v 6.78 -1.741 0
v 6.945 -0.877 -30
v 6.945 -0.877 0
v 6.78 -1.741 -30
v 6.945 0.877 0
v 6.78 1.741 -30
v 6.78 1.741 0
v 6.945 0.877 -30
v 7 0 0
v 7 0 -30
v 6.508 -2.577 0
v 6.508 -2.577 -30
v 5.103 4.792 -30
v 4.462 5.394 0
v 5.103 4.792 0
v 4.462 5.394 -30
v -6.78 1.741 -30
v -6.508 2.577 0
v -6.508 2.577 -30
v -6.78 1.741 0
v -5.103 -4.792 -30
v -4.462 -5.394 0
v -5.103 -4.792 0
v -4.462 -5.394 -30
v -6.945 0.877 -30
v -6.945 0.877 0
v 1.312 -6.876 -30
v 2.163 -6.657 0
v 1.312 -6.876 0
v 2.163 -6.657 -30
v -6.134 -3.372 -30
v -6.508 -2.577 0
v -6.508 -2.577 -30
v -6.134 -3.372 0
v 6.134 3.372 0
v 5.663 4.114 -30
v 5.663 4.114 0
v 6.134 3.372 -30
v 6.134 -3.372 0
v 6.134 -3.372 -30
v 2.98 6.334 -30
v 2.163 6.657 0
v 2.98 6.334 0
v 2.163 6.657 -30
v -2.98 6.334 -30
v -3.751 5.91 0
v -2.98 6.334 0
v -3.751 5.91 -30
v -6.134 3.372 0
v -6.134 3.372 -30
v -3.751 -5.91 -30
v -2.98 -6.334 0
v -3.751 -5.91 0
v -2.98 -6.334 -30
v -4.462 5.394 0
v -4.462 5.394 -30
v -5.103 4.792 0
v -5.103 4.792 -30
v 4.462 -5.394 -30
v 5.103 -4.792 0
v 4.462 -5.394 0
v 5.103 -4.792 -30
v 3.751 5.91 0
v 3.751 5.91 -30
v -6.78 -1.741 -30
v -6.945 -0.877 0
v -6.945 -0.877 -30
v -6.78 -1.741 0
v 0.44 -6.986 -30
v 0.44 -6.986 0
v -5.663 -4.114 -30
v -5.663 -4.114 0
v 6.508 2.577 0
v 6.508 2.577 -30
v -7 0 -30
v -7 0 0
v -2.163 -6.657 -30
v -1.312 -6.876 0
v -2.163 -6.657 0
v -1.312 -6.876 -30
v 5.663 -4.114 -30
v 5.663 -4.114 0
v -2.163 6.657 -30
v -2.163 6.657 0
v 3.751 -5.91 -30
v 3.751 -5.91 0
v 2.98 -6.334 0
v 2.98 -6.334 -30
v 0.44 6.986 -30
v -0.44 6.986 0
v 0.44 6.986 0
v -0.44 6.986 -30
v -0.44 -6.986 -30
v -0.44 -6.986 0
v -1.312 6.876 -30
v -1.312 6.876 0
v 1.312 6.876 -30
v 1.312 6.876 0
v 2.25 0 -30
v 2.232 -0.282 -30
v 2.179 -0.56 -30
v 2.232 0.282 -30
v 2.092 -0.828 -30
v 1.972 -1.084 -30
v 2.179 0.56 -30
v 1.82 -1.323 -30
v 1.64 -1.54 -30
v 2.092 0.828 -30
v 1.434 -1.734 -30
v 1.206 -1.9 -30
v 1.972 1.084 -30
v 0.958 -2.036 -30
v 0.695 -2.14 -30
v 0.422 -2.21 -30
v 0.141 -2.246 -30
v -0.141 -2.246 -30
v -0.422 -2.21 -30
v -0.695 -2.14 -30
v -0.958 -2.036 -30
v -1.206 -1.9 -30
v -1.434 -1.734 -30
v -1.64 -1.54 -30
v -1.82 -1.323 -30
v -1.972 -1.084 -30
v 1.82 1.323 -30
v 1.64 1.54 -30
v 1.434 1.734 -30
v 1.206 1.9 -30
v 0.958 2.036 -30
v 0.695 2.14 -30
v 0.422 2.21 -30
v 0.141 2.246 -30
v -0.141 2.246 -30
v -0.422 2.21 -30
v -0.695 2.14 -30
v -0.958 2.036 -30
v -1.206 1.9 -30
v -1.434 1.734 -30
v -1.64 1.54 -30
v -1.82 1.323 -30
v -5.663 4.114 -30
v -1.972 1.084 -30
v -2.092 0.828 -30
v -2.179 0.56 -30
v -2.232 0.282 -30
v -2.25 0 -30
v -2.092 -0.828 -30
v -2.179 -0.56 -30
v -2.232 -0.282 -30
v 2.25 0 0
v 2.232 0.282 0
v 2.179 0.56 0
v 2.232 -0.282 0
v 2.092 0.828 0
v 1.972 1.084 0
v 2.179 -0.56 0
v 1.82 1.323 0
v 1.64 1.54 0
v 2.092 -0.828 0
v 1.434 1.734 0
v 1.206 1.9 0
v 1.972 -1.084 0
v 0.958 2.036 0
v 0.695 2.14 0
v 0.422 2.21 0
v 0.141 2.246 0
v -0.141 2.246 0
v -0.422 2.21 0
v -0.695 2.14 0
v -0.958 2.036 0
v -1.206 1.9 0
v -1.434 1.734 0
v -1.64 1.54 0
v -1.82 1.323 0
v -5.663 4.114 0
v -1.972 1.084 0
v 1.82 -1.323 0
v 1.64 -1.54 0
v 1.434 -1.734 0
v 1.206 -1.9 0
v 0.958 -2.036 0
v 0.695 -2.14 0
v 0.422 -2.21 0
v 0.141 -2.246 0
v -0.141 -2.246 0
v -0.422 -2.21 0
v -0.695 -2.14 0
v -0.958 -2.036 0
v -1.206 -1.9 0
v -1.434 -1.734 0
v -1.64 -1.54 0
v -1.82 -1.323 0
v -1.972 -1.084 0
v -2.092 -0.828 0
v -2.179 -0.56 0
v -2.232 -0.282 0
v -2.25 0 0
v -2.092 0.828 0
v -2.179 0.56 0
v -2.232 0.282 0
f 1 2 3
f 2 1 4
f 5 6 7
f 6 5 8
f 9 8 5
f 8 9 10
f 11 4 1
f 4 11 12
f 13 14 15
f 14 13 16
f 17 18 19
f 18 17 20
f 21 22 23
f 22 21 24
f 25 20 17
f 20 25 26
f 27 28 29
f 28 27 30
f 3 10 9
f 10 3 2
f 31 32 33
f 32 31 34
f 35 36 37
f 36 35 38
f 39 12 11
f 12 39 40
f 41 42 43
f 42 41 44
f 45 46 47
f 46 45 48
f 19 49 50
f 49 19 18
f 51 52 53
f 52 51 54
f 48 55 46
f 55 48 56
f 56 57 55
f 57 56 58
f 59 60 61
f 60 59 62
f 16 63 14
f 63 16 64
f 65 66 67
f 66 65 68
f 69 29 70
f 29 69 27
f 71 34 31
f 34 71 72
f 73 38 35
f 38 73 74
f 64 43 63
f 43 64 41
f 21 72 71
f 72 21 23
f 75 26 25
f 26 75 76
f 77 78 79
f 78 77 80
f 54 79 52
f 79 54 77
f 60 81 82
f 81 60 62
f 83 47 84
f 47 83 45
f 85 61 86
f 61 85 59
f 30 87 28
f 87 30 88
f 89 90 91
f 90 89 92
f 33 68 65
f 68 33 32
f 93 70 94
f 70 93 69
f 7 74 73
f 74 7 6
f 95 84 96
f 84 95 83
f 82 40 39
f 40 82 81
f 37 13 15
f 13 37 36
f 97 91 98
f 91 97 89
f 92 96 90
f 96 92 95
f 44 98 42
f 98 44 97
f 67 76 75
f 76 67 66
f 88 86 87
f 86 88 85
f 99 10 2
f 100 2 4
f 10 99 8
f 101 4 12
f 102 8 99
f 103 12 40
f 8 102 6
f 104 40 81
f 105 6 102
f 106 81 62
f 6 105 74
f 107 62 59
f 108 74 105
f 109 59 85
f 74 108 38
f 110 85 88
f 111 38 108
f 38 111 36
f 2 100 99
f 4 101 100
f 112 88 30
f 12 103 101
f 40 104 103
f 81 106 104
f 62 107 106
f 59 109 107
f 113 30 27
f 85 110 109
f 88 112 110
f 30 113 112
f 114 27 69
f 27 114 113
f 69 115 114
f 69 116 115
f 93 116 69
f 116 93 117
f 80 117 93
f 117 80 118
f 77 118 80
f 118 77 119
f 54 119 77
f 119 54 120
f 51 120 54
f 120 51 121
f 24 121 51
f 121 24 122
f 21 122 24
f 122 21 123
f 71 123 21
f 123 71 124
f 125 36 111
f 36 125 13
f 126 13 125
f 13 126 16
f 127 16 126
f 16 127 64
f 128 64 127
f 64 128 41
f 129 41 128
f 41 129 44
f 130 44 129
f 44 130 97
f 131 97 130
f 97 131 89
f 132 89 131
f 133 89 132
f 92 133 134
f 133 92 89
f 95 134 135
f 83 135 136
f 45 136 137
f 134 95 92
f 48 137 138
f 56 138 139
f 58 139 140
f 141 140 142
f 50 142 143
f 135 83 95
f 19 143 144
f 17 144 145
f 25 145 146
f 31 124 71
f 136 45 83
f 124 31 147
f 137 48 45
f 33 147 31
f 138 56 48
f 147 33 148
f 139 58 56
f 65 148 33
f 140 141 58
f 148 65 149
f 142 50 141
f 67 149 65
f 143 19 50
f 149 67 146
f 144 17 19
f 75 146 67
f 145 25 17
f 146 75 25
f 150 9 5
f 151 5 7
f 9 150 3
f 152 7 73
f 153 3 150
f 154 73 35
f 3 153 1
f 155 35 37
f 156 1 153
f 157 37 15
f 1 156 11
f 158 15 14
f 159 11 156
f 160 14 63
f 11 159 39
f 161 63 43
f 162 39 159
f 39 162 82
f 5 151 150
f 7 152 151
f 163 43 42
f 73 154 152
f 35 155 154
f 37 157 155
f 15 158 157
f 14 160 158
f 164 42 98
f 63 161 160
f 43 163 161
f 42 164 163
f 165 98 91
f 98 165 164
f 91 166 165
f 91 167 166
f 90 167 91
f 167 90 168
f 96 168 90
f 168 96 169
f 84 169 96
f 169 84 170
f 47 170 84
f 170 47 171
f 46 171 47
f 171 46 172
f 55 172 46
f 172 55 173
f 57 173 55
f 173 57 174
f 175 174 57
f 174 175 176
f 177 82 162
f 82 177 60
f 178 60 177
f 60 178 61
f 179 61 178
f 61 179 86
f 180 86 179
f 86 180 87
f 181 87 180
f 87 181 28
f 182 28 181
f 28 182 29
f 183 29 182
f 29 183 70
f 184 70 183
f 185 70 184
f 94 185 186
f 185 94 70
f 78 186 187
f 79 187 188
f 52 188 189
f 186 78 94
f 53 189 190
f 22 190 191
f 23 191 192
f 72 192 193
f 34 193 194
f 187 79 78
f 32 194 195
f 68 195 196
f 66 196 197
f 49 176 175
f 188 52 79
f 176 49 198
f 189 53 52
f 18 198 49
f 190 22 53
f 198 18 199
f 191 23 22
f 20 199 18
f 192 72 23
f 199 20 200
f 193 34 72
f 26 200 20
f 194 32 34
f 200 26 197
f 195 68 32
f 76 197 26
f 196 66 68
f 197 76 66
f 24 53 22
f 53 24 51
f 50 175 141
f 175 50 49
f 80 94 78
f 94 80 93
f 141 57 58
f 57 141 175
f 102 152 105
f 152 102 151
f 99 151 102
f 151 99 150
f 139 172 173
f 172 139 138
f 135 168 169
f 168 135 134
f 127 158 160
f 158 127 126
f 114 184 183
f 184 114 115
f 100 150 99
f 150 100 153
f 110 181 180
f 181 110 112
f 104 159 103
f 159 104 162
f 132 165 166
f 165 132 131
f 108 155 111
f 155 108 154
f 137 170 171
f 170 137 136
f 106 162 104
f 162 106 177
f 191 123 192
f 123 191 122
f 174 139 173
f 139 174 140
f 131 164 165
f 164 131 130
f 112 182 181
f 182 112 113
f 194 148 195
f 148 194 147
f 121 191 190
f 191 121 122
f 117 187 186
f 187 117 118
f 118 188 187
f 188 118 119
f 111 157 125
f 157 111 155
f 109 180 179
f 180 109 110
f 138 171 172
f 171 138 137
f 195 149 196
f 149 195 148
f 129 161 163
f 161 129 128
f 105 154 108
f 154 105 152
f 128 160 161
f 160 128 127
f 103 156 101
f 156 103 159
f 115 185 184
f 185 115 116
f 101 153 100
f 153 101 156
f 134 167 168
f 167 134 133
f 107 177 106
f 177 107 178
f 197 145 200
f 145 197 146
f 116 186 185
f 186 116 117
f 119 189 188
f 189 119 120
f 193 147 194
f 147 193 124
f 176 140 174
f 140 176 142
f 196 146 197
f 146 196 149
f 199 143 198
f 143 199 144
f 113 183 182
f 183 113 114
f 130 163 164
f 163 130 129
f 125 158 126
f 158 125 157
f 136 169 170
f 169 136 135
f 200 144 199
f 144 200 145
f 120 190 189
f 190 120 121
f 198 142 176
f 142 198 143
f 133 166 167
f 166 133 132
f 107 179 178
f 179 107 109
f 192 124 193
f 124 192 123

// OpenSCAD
$fn = 50;


difference() {
	union() {
		translate(v = [0, 0, -30.0000000000]) {
			cylinder(h = 30, r = 7.0000000000);
		}
		cylinder(h = 0, r = 10.0000000000);
	}
	union() {
		#translate(v = [0, 0, -30]) {
			cylinder(h = 30, r = 2.2500000000);
		}
	}
}
